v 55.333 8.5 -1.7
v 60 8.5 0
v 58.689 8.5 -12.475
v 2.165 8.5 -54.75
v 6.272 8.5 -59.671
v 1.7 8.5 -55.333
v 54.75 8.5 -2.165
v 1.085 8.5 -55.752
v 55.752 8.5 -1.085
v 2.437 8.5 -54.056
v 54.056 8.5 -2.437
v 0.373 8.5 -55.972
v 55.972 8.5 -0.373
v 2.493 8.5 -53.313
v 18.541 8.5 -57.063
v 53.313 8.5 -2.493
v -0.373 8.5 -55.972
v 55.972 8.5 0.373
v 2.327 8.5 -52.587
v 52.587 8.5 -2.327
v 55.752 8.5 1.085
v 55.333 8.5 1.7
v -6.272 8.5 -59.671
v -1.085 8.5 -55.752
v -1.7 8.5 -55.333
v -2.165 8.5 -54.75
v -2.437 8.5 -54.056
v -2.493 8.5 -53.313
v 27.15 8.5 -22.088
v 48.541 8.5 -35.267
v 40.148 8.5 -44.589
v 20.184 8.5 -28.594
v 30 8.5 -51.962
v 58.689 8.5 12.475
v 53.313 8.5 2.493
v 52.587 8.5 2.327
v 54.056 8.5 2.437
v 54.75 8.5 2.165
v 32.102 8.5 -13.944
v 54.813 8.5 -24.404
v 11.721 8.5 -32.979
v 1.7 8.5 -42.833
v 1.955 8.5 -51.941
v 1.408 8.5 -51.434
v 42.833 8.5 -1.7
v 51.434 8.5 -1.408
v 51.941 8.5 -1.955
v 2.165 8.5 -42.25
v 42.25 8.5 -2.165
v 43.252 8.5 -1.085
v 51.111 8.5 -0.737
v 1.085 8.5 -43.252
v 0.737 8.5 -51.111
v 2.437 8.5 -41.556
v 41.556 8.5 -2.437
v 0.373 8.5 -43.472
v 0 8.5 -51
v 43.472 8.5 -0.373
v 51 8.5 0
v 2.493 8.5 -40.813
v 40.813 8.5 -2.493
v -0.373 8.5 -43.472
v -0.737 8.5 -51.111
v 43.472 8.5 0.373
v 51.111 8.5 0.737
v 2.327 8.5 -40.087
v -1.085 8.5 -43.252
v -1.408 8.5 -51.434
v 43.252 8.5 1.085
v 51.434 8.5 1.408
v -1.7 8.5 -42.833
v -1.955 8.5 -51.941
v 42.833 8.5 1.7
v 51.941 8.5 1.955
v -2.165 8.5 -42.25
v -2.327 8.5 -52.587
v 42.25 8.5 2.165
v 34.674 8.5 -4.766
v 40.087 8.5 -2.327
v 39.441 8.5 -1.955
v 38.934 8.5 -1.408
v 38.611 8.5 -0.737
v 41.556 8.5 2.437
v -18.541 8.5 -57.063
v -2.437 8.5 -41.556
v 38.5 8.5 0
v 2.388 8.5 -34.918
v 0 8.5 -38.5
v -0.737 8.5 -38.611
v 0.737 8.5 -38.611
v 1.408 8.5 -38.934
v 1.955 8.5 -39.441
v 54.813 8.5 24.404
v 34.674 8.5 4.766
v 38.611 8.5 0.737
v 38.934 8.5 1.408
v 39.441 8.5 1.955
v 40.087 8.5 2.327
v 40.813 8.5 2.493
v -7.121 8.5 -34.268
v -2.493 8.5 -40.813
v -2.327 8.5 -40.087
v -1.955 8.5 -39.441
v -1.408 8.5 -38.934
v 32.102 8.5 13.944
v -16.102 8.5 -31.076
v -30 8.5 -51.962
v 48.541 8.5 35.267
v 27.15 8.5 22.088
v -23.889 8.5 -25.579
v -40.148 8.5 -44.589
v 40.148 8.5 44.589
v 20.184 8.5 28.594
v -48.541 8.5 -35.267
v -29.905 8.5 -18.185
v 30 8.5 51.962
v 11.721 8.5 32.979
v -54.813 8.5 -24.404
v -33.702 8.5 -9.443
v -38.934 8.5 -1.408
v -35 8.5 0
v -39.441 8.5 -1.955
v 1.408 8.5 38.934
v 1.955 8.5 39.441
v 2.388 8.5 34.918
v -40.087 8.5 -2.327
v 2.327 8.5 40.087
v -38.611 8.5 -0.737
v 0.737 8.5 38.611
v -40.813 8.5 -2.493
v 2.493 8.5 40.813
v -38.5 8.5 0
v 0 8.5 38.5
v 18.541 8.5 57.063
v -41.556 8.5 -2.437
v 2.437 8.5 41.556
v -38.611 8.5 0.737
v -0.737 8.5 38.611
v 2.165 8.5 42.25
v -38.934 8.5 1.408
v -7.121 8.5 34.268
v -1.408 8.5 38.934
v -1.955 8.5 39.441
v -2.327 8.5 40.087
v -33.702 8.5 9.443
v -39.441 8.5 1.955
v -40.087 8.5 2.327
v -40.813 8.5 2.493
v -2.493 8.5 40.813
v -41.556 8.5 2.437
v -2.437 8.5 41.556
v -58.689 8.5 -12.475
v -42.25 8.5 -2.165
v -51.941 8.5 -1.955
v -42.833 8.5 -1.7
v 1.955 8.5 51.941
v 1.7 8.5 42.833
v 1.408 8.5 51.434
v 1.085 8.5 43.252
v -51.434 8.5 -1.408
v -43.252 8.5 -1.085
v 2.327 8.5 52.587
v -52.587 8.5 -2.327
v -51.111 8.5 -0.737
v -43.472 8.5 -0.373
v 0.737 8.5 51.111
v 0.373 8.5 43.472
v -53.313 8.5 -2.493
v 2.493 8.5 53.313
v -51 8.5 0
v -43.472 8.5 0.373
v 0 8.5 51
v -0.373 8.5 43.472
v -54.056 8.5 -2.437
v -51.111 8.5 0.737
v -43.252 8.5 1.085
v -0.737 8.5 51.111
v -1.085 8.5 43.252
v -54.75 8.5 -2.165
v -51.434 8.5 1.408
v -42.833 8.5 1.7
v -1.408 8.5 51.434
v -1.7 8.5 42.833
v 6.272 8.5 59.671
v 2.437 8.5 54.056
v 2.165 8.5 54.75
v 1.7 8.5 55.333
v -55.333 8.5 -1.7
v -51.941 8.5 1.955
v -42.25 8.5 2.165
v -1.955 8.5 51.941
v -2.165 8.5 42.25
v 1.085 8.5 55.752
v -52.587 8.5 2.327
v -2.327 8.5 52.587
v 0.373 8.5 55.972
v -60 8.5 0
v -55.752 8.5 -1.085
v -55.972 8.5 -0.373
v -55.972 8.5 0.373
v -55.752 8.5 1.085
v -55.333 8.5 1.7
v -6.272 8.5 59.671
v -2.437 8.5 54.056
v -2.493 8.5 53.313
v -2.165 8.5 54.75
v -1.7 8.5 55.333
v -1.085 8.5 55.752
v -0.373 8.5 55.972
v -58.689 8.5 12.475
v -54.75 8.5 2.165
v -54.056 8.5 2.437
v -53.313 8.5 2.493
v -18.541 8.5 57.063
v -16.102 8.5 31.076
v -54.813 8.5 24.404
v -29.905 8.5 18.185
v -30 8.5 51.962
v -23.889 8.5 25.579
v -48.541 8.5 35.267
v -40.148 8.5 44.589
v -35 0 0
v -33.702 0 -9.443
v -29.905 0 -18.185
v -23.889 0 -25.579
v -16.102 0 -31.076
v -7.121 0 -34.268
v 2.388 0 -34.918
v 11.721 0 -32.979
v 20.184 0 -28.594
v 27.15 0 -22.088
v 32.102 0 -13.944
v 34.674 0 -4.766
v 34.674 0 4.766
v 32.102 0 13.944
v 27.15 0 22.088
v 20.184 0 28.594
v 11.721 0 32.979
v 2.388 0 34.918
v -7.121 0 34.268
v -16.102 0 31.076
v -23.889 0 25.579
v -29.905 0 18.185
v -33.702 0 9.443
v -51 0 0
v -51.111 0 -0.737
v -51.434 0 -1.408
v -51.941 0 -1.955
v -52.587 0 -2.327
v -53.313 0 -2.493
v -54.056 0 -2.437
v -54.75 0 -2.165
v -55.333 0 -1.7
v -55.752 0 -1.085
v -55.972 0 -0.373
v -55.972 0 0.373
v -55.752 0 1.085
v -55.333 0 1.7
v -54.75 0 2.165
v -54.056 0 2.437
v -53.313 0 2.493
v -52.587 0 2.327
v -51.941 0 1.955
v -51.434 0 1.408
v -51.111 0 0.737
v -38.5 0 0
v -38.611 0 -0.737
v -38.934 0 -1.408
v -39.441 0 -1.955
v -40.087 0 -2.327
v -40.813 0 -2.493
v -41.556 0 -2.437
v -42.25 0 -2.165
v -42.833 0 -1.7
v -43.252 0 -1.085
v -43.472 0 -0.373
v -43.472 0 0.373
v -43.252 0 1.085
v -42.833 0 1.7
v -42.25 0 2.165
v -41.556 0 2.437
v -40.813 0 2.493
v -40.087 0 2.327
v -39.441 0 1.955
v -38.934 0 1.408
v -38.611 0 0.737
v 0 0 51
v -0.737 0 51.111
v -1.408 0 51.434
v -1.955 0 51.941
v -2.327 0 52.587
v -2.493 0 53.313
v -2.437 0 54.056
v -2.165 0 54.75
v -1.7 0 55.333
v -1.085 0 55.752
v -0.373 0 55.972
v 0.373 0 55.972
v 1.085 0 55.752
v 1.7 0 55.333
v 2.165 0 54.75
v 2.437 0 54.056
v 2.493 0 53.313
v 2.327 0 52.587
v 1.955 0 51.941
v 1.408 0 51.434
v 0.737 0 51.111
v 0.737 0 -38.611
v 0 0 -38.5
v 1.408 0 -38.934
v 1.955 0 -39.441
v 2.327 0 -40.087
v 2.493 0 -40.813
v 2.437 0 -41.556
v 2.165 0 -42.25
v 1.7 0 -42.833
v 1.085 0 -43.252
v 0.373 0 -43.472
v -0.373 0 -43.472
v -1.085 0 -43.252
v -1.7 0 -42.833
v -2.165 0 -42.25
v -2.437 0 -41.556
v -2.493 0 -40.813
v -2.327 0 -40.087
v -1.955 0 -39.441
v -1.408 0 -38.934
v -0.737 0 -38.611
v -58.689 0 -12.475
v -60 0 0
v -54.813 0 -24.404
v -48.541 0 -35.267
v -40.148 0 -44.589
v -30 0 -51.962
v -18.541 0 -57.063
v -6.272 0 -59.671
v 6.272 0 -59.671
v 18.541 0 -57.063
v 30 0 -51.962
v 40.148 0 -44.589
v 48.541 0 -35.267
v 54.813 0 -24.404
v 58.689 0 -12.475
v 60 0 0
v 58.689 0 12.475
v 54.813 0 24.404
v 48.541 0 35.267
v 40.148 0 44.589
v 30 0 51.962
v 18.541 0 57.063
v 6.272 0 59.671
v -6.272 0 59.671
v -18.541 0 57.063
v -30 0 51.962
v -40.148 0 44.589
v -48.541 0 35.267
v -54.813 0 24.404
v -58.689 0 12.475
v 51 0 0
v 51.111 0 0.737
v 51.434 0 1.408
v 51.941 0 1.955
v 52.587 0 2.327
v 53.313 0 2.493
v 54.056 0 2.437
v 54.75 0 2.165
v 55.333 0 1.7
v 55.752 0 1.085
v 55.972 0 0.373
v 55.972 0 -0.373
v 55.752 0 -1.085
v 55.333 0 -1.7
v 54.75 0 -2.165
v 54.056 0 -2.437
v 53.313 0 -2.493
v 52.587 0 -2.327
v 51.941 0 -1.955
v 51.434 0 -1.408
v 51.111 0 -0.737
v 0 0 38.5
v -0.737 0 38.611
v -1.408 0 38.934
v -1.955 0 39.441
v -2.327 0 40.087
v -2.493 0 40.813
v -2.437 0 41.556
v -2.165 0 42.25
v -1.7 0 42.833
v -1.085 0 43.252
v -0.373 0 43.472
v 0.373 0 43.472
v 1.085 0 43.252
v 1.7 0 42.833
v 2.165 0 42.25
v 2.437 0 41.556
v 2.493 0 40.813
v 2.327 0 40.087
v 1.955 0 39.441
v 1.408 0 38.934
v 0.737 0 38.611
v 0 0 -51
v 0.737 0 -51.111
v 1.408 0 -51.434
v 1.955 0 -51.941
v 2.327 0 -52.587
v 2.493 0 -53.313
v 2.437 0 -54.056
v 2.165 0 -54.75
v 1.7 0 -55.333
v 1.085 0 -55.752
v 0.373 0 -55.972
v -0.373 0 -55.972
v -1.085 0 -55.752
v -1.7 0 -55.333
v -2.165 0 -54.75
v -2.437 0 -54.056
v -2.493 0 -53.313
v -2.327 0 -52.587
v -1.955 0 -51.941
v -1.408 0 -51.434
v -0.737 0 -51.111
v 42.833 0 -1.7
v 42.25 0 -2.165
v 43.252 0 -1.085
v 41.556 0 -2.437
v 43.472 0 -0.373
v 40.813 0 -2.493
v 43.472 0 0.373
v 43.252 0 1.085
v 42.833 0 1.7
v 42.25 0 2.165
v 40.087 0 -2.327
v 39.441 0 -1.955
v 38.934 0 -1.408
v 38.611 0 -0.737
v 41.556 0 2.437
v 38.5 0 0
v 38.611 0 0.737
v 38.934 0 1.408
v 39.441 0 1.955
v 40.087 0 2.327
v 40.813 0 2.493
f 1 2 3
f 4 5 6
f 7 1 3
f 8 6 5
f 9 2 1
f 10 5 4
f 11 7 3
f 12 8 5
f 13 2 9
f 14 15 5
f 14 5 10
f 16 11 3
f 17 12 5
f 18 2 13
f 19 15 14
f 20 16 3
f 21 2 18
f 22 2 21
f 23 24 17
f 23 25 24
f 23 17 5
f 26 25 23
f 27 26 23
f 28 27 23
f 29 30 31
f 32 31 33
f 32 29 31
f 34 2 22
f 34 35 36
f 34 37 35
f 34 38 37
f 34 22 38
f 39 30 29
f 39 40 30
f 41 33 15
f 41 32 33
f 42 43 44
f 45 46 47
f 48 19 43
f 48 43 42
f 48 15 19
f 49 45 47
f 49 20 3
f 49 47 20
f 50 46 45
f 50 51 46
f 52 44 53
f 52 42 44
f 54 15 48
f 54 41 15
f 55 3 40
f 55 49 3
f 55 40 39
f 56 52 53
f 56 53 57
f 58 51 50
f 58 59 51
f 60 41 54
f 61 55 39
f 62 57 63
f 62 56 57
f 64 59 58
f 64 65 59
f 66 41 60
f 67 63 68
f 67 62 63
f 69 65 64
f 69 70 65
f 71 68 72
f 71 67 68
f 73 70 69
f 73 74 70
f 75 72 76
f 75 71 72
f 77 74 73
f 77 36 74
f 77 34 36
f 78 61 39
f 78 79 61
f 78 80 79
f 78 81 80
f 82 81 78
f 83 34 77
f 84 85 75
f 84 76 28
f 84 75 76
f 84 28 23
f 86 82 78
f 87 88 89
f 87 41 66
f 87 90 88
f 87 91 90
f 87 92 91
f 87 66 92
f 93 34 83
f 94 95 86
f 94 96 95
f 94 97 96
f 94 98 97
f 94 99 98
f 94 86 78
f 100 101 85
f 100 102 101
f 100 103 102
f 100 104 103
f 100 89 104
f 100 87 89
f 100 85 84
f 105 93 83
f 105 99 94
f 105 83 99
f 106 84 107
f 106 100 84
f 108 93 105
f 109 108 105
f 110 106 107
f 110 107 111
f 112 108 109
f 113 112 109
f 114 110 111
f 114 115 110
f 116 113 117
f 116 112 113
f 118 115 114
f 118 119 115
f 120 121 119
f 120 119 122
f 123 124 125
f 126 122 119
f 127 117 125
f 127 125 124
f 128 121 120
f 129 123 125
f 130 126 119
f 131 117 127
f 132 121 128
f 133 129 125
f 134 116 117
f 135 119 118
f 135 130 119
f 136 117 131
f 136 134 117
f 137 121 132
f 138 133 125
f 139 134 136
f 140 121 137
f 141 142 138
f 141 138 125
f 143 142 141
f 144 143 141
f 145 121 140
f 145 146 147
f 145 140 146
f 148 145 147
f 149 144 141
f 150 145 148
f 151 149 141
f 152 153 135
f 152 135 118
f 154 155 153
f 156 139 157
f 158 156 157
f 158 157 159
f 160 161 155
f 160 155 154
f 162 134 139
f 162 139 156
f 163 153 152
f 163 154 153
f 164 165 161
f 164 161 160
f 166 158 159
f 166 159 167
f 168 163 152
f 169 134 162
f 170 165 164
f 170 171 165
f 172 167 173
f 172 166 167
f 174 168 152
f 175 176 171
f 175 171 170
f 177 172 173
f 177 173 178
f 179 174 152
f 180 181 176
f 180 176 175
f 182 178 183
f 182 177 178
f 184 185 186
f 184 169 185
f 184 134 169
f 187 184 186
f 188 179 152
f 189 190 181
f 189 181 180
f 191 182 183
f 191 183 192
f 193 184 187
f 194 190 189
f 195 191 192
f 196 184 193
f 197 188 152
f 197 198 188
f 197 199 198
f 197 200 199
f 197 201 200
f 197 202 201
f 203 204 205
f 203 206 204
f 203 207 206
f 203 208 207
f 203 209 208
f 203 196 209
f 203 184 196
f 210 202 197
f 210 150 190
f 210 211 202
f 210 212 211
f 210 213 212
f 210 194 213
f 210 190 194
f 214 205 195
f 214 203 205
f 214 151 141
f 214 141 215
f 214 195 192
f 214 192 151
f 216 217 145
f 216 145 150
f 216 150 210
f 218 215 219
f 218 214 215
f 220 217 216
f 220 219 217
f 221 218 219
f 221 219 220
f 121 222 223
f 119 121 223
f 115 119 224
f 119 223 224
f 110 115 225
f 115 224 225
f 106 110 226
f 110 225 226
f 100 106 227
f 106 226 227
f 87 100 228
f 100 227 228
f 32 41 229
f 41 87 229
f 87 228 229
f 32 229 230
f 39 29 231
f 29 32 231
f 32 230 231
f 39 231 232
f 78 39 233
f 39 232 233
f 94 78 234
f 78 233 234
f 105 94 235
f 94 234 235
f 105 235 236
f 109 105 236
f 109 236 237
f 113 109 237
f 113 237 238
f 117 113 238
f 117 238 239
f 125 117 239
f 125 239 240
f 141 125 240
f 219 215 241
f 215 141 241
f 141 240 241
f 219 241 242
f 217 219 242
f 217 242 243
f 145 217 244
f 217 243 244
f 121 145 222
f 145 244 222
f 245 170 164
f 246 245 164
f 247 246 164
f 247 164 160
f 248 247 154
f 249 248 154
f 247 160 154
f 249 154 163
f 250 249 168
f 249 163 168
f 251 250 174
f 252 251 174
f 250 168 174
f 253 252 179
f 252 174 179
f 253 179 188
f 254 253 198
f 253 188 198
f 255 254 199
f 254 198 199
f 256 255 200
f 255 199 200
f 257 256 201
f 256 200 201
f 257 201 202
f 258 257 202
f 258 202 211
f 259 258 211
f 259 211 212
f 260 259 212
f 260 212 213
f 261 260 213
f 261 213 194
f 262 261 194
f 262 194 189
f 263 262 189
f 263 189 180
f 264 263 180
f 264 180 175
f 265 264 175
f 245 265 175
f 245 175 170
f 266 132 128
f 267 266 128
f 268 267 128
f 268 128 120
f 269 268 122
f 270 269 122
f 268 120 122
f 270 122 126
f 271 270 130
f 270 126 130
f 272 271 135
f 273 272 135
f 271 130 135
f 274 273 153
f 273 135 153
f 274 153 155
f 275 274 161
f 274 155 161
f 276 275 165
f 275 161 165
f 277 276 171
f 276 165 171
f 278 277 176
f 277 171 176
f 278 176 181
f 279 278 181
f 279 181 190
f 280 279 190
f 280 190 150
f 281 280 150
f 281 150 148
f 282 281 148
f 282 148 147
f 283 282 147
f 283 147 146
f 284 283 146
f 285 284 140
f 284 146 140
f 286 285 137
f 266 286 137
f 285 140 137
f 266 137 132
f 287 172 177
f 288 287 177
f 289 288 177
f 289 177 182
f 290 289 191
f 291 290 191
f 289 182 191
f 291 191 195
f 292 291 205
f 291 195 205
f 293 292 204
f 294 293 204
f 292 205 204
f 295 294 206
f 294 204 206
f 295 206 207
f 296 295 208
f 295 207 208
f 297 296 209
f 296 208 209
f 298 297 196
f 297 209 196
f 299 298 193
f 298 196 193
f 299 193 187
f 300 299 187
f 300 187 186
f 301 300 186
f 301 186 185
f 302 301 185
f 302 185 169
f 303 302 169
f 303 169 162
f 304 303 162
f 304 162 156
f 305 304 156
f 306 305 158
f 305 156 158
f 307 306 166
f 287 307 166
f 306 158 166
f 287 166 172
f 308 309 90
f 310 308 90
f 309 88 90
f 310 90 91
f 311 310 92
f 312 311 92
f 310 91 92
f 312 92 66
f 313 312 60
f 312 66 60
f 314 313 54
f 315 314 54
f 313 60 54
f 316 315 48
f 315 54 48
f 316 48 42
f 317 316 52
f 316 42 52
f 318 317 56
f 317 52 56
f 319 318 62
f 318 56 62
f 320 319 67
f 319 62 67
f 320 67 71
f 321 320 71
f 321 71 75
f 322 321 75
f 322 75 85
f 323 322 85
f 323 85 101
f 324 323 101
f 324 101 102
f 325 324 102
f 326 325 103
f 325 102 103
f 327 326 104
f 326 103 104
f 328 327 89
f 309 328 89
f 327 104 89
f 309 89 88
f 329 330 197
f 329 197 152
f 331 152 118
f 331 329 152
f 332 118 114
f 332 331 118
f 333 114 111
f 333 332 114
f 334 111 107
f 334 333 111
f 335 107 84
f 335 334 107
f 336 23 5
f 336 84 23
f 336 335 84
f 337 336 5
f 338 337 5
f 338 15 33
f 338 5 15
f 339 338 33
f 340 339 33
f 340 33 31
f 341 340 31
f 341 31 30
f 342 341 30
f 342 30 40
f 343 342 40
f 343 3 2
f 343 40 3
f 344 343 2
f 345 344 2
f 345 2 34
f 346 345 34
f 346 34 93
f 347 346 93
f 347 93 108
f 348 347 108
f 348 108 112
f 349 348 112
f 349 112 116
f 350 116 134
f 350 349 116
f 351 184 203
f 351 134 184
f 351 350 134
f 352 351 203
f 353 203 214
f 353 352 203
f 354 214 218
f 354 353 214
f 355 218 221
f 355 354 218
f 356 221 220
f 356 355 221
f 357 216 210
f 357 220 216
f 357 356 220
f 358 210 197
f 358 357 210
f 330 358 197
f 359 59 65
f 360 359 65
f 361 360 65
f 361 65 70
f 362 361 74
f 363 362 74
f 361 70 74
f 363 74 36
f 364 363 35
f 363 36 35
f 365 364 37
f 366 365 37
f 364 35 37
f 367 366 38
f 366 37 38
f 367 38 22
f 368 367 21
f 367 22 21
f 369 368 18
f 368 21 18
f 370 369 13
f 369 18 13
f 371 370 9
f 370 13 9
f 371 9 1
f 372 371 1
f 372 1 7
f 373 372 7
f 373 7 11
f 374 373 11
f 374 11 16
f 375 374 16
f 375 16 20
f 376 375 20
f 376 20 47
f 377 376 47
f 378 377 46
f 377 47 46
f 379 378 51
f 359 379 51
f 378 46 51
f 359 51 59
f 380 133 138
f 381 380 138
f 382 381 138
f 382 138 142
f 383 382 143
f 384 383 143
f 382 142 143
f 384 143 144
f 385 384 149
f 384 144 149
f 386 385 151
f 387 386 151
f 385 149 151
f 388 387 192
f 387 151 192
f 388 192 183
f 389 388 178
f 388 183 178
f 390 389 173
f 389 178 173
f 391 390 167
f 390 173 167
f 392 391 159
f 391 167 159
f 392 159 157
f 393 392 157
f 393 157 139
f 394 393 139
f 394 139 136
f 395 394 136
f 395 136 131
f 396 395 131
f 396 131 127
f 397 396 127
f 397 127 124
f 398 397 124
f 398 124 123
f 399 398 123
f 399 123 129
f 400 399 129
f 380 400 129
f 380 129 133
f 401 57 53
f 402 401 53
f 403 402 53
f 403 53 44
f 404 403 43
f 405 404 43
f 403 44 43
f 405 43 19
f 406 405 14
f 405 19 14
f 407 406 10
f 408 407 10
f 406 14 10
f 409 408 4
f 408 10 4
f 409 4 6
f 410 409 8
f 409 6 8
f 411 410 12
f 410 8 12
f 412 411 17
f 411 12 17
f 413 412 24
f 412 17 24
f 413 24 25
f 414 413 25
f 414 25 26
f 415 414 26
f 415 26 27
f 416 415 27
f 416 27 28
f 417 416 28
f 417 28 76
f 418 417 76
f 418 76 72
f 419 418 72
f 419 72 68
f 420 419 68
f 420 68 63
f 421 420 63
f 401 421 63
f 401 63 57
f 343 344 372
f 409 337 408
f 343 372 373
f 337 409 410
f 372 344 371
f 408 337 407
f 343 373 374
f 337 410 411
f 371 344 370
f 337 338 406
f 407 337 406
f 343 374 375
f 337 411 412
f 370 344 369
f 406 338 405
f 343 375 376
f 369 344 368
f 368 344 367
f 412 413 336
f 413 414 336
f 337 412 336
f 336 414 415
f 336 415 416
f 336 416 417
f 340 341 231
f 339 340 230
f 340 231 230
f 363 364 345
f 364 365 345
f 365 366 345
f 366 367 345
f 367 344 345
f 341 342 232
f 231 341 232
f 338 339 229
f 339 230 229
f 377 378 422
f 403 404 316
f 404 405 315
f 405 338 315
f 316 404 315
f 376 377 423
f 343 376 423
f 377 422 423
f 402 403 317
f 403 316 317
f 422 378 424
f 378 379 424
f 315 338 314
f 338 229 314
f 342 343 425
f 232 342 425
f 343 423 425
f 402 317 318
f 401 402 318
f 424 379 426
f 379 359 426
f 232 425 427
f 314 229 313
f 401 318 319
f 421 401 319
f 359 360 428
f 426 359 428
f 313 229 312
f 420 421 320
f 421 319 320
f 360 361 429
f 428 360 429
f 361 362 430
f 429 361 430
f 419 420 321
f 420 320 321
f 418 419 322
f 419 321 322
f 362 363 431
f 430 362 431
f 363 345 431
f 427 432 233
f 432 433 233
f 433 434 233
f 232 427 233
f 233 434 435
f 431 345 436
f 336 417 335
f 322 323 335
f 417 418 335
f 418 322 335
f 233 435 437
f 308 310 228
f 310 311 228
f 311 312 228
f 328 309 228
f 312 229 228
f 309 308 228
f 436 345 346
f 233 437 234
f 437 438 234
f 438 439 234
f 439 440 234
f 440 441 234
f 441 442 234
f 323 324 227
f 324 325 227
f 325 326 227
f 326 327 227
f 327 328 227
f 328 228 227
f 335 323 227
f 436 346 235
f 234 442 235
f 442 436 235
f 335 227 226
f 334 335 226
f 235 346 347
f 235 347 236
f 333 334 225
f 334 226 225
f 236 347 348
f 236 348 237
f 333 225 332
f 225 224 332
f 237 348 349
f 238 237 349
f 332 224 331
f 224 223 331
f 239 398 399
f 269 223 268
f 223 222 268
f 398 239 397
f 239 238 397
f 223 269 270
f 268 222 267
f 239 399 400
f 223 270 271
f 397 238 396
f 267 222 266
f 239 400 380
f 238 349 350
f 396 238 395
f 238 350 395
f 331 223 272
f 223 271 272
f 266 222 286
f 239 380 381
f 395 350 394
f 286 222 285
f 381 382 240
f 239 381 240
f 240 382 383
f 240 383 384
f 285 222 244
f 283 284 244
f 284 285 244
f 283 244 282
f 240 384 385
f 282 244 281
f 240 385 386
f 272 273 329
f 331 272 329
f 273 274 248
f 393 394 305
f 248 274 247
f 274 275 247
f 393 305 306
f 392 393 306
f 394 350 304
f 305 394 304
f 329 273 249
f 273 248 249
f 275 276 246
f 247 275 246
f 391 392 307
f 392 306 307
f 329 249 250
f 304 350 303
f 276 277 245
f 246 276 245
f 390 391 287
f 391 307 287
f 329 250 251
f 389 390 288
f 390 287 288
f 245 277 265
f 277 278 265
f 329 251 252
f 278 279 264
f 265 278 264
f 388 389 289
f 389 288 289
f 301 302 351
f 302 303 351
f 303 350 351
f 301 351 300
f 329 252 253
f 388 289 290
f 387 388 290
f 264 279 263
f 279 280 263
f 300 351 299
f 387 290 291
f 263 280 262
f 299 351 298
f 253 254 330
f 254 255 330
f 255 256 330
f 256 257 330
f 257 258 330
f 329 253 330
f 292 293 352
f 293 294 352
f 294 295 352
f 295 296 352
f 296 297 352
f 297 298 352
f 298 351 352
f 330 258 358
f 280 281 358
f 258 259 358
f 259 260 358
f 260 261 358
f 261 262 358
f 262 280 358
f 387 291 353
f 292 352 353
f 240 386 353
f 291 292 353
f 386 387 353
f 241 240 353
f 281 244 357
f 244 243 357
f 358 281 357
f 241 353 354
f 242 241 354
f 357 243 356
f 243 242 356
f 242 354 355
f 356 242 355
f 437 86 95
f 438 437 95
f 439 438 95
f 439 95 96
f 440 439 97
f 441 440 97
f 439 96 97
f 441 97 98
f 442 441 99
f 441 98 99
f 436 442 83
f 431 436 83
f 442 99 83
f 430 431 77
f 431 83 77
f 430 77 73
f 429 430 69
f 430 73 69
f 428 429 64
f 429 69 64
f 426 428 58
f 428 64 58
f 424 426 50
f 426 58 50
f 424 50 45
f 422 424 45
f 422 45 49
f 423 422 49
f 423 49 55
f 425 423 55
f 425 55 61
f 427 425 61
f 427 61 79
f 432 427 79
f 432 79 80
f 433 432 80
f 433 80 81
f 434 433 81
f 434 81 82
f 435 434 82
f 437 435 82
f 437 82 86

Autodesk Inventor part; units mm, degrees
ref_plane "YZ Plane" through (0, 0, 0) normal (1, 0, 0) x (0, 1, 0)
ref_plane "XZ Plane" through (0, 0, 0) normal (0, 1, 0) x (-1, 0, 0)
ref_plane "XY Plane" through (0, 0, 0) normal (0, 0, 1) x (1, 0, 0)
sketch "Sketch1" plane through (0, 0, 0) normal (0, 1, 0) x (-1, 0, 0)
  circle A0 centre (0, 0) radius 35
  circle A1 centre (0, 0) radius 60
  dimension "d0" = 70
  dimension "d1" = 120
extrude "Extrusion1" add sketch "Sketch1" along normal blind 8.5
sketch "Sketch2" plane through (0, 8.5, 0) normal (0, 1, 0) x (1, 0, 0)
  circle A0 centre (-41, 0) radius 2.5
  circle A1 centre (-53.5, 0) radius 2.5
  line L0 (-41, 0) -> (0, 0) construction
  line L1 (-41, 0) -> (-53.5, 0) construction
  dimension "d4" = 5
  dimension "d5" = 5
  dimension "d6" = 41
  dimension "d7" = 53.5
extrude "Extrusion2" cut sketch "Sketch2" against normal through all
pattern_circular "Circular Pattern1" count 4 over 360 about axis through (0, 0, 0) along (0, 1, 0) of "Extrusion2"
properties part number "Bearing" material "Aluminum 6061"
